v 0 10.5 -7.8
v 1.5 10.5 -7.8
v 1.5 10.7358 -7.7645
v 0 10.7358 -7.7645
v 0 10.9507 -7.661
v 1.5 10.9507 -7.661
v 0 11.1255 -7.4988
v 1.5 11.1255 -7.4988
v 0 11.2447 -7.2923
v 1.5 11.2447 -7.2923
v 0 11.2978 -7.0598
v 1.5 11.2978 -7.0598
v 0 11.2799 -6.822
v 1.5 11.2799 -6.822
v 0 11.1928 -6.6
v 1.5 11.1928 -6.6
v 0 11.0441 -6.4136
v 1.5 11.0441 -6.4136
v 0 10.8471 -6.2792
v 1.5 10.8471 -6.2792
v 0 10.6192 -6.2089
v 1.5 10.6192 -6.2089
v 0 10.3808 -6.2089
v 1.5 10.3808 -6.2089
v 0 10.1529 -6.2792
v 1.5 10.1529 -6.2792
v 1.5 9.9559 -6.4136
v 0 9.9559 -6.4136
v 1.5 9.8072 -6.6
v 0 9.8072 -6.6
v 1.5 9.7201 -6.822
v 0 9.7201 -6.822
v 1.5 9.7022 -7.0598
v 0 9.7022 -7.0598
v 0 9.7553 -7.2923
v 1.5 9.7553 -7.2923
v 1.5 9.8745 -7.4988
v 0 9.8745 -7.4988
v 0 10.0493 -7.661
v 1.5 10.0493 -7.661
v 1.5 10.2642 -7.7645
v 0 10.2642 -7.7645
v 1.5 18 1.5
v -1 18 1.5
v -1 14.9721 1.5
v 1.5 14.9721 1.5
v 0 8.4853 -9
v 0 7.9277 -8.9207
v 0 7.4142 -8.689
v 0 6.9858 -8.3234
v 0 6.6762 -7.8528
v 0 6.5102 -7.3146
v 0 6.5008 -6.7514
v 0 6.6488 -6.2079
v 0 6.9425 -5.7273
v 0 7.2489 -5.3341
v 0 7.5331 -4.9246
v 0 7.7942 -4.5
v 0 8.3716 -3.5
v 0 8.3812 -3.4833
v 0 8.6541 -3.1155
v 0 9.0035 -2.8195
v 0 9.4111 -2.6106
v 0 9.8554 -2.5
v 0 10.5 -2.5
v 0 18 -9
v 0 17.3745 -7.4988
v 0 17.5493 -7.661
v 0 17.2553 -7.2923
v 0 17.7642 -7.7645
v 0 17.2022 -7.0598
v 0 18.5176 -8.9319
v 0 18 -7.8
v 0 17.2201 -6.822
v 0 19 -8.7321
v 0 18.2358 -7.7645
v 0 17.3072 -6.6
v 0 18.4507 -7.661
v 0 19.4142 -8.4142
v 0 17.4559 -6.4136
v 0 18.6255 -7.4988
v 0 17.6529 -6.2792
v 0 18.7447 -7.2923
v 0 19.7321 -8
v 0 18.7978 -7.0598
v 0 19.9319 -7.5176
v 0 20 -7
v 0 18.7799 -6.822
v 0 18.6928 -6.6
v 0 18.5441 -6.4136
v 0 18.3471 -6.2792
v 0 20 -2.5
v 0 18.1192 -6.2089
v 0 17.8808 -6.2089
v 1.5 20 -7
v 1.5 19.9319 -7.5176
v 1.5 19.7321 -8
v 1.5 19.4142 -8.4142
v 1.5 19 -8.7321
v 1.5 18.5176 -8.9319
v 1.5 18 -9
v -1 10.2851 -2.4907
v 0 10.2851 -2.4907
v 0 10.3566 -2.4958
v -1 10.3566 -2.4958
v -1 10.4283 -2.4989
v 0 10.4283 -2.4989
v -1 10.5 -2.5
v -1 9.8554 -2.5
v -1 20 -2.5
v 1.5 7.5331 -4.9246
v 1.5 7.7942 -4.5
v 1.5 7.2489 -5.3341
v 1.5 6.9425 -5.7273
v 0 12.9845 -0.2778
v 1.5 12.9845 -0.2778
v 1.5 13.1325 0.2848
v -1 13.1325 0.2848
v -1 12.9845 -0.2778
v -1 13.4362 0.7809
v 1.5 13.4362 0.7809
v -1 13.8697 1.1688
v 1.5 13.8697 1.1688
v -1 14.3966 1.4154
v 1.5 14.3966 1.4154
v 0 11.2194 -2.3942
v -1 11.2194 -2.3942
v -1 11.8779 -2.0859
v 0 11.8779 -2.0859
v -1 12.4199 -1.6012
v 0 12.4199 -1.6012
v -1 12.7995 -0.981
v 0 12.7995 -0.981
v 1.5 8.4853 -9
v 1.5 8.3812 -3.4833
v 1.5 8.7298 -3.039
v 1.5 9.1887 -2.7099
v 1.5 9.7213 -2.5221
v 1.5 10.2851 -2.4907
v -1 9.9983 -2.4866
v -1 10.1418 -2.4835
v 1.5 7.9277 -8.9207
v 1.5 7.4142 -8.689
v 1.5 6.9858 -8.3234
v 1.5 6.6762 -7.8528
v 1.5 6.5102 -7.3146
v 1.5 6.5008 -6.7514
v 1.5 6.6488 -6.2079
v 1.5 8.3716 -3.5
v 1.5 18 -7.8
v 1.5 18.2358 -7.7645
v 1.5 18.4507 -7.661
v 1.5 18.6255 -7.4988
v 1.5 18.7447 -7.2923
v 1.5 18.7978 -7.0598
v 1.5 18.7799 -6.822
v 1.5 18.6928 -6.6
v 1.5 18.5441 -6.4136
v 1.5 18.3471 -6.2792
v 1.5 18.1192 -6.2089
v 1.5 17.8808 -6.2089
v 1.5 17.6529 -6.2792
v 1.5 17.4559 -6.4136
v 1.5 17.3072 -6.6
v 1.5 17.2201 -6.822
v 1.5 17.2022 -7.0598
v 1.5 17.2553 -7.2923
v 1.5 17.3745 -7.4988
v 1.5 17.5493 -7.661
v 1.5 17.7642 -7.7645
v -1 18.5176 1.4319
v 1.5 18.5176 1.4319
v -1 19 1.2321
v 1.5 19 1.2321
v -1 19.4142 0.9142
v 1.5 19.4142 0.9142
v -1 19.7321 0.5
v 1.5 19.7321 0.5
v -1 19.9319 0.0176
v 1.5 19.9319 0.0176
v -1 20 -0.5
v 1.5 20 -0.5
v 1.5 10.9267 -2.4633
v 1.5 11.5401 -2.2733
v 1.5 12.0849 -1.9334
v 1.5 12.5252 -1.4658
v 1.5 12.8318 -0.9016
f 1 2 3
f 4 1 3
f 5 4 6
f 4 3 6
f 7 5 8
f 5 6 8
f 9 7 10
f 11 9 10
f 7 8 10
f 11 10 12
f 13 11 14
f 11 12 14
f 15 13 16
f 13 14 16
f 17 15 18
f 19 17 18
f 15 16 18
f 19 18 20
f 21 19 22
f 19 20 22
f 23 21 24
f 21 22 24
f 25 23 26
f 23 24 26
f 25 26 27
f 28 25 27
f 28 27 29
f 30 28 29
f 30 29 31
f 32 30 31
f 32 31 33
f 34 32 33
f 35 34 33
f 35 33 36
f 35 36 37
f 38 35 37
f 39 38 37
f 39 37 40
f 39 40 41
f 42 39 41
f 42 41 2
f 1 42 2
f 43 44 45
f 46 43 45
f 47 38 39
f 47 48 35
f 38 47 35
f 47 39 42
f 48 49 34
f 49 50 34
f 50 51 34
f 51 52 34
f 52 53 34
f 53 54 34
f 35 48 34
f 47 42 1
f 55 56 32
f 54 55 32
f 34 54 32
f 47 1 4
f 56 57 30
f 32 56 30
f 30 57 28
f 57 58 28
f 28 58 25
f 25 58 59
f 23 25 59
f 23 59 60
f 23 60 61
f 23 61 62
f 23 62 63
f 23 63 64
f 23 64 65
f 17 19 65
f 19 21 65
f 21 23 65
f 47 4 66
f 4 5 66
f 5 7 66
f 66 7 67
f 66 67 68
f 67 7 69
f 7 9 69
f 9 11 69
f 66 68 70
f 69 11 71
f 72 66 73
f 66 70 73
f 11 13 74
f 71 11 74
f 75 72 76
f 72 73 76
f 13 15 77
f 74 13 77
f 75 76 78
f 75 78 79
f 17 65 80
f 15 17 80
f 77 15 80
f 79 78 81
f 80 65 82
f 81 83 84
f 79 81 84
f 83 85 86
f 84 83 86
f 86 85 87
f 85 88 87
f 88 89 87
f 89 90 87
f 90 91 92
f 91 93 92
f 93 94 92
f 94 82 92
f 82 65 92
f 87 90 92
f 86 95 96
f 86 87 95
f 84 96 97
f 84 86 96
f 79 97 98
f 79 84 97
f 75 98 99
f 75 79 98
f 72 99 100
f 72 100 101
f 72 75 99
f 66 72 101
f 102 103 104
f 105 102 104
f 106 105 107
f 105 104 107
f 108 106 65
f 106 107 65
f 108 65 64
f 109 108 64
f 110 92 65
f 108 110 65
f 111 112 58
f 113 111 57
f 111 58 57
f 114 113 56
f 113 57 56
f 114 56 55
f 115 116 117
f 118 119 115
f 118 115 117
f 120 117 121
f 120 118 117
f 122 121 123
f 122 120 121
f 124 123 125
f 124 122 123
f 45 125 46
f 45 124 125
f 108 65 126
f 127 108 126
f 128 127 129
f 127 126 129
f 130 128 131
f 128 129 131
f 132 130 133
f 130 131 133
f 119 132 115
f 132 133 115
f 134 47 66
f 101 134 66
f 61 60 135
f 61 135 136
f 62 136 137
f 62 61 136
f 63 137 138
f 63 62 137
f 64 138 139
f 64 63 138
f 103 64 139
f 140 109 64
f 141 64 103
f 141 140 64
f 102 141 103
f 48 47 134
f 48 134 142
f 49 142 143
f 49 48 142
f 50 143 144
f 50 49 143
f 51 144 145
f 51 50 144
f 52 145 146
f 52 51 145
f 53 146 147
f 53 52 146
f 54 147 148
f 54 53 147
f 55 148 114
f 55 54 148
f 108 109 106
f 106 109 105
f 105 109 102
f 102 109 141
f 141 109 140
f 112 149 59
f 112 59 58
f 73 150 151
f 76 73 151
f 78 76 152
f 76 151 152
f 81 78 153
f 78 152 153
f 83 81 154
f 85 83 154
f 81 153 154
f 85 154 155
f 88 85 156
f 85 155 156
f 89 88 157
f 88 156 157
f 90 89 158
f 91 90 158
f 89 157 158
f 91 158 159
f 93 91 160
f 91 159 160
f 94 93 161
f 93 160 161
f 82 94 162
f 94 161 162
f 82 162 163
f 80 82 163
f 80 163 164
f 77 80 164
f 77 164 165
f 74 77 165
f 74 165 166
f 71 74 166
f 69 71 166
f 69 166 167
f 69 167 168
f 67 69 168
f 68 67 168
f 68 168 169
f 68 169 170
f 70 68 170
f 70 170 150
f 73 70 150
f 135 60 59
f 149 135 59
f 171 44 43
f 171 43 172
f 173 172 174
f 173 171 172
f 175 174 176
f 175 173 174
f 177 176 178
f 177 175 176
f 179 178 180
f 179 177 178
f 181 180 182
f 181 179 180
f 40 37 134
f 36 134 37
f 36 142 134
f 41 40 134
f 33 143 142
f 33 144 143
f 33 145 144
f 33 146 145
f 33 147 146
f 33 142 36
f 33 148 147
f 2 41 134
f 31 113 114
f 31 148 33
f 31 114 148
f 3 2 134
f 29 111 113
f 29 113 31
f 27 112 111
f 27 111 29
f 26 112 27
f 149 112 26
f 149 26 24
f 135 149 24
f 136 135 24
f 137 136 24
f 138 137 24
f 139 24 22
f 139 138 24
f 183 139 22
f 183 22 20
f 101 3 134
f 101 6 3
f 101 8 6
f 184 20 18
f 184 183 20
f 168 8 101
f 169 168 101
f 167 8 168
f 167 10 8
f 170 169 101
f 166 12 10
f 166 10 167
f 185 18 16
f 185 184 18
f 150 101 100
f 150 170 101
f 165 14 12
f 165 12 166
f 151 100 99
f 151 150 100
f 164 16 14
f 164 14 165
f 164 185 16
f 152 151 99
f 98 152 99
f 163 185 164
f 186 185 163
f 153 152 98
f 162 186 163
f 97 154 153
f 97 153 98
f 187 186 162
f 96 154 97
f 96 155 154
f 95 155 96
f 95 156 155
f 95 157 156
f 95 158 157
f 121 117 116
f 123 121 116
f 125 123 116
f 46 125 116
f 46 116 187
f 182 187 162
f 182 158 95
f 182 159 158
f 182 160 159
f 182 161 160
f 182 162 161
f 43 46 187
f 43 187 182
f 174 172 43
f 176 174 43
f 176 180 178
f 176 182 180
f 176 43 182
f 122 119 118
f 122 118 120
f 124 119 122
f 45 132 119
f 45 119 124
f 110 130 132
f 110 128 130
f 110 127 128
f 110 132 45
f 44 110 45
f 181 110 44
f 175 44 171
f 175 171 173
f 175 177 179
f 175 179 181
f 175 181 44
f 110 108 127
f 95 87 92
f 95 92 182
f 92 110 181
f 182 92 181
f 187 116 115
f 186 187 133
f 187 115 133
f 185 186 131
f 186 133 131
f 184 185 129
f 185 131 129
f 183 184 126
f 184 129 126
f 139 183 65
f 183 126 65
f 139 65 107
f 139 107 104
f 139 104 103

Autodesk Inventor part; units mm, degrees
ref_plane "YZ Plane" through (0, 0, 0) normal (1, 0, 0) x (0, 1, 0)
ref_plane "XZ Plane" through (0, 0, 0) normal (0, 1, 0) x (-1, 0, 0)
ref_plane "XY Plane" through (0, 0, 0) normal (0, 0, 1) x (1, 0, 0)
sketch "スケッチ1" plane through (0, 0, 0) normal (1, 0, 0) x (0, 1, 0)
  circle A0 centre (0, 0) radius 9
  line L0 (50, 5.5) -> (-9, 5.5)
  line L1 (-9, 5.5) -> (-9, -13.5)
  line L2 (-9, -13.5) -> (50, -13.5)
  line L3 (50, -13.5) -> (50, 5.5)
  line L4 (50, 13.5) -> (-9, 13.5)
  line L5 (-9, 13.5) -> (-9, -13.5)
  line L6 (-9, -13.5) -> (50, -13.5)
  line L7 (50, -13.5) -> (50, 13.5)
  line L8 (-20.8, 0) -> (61.8, 0) projected
  point P0 (-9, 0)
  dimension "d0" = 18
  dimension "d3" = 19
  dimension "d4" = 27
extrude "押し出し1" add sketch "スケッチ1" along normal blind 1.5 contours L8 L3 L2 L1 A0 | A0 L0 L3 L8 | L1 L0 A0
sketch "スケッチ2" plane through (0, 0, 0) normal (-1, 0, 0) x (0, 0, 1)
  arc A0 (-0.2778, 12.9845) -> (-2.4907, 10.2851) centre (0, 10.5) ccw projected
  line L0 (-3.4833, 8.3812) -> (-3.5, 8.3716) projected
  line L1 (-3.5, 8.3716) -> (-3.5, 20) projected
  line L2 (-3.5, 20) -> (-0.5, 20) projected
  line L3 (-7, 20) -> (-3.5, 20) projected
  arc A1 (-4.5, 7.7942) -> (-5.7273, 6.9425) centre (0, 0) ccw projected
  line L4 (-3.5, 8.3716) -> (-4.5, 7.7942) projected
  arc A2 (5.5, 7.1239) -> (0, -9) centre (0, 0) ccw projected
  line L5 (5.5, 50) -> (5.5, 7.1239) projected
  line L6 (-13.5, 50) -> (5.5, 50) projected
  line L7 (-13.5, -9) -> (-13.5, 50) projected
  line L8 (0, -9) -> (-13.5, -9) projected
  line L9 (5.5, -9) -> (0, -9) projected
  line L10 (5.5, -7.1239) -> (5.5, -9) projected
  arc A3 (0, -9) -> (5.5, -7.1239) centre (0, 0) ccw projected
  arc A4 (-3.4833, 8.3812) -> (-2.4907, 10.2851) centre (-4.4833, 10.1132) ccw projected
  arc A5 (1.5, 18) -> (-0.5, 20) centre (-0.5, 18) ccw projected
  line L11 (1.5, 18) -> (1.5, 14.9721) projected
  arc A6 (-0.2778, 12.9845) -> (1.5, 14.9721) centre (-0.5, 14.9721) ccw projected
  line L12 (-9, 8.4853) -> (-9, 18) projected
  arc A7 (-7, 20) -> (-9, 18) centre (-7, 18) ccw projected
  arc A8 (-9, 8.4853) -> (-5.7273, 6.9425) centre (-7, 8.4853) ccw projected
  point P0 (-4.5, 7.7942)
  point P1 (-5.7273, 6.9425)
extrude "押し出し2" cut sketch "スケッチ2" against normal through all contours A6 L11 A5 L2 L3 A7 L12 A8 A2 L8 L7 L6 L5 L4 L0 A4 A0 | A3 L10 L9
sketch "スケッチ3" plane through (0, 0, 0) normal (-1, 0, 0) x (0, 0, 1)
  line L0 (-3.5, 20) -> (-3.5, 8.3716) projected
  line L1 (-4.5, 7.7942) -> (-3.4833, 8.3812) projected
  arc A0 (-0.2778, 12.9845) -> (-2.4907, 10.2851) centre (0, 10.5) ccw projected
  line L2 (-0.5, 20) -> (-7, 20) projected
  arc A1 (-4.5, 7.7942) -> (-5.7273, 6.9425) centre (0, 0) ccw projected
  line L3 (-3.5, 20) -> (-2.5, 20)
  line L4 (-2.5, 20) -> (-2.5, 8.3716)
  line L5 (-2.5, 8.3716) -> (-3.5, 8.3716)
  line L6 (-3.5, 8.3716) -> (-3.5, 20)
  arc A2 (-3.4833, 8.3812) -> (-2.4907, 10.2851) centre (-4.4833, 10.1132) ccw projected
  arc A3 (-0.2778, 12.9845) -> (1.5, 14.9721) centre (-0.5, 14.9721) ccw projected
  line L7 (1.5, 14.9721) -> (1.5, 18) projected
  arc A4 (1.5, 18) -> (-0.5, 20) centre (-0.5, 18) ccw projected
  arc A5 (-7, 20) -> (-9, 18) centre (-7, 18) ccw projected
  line L8 (-9, 18) -> (-9, 8.4853) projected
  arc A6 (-9, 8.4853) -> (-5.7273, 6.9425) centre (-7, 8.4853) ccw projected
  line L9 (-2.5, 8.3716) -> (-2.5, 10.5)
  point P0 (-2.5, 9.8557)
  dimension "d7" = 1
extrude "押し出し3" add sketch "スケッチ3" along normal blind 1 contours L2 A4 L7 A3 A0 L4 | A0 A2 L4
sketch "スケッチ4" plane through (1.5, 0, 0) normal (1, 0, 0) x (0, 0, -1)
  circle A0 centre (7, 18) radius 0.8
  circle A1 centre (7, 10.5) radius 0.8
  line L0 (7, 20) -> (0.5, 20) projected
  arc A2 (2.4907, 10.2851) -> (0.2778, 12.9845) centre (0, 10.5) ccw projected
  point P0 (0, 0)
  point P1 (-1.5, 20)
  point P2 (-1.5, 12.5)
  point P3 (2.1169, 9.1701)
  dimension "d10" = 1.6
  dimension "d11" = 1.6
  dimension "d12" = 2
extrude "押し出し4" cut sketch "スケッチ4" against normal through all
properties part number "toe_springjoint_cover_upper_left"
